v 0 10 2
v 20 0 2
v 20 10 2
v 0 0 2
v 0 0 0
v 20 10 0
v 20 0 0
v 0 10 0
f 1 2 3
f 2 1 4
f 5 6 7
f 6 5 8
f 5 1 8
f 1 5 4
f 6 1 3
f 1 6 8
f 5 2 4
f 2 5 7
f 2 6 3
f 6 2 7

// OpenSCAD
scad_live_material = "all";
echo(scad_live_materials = ["primary", "secondary"]);
if (scad_live_material == "all" || scad_live_material == "primary")
    cube([10, 10, 2]);
if (scad_live_material == "all" || scad_live_material == "secondary")
    translate([10, 0, 0]) cube([10, 10, 2]);
